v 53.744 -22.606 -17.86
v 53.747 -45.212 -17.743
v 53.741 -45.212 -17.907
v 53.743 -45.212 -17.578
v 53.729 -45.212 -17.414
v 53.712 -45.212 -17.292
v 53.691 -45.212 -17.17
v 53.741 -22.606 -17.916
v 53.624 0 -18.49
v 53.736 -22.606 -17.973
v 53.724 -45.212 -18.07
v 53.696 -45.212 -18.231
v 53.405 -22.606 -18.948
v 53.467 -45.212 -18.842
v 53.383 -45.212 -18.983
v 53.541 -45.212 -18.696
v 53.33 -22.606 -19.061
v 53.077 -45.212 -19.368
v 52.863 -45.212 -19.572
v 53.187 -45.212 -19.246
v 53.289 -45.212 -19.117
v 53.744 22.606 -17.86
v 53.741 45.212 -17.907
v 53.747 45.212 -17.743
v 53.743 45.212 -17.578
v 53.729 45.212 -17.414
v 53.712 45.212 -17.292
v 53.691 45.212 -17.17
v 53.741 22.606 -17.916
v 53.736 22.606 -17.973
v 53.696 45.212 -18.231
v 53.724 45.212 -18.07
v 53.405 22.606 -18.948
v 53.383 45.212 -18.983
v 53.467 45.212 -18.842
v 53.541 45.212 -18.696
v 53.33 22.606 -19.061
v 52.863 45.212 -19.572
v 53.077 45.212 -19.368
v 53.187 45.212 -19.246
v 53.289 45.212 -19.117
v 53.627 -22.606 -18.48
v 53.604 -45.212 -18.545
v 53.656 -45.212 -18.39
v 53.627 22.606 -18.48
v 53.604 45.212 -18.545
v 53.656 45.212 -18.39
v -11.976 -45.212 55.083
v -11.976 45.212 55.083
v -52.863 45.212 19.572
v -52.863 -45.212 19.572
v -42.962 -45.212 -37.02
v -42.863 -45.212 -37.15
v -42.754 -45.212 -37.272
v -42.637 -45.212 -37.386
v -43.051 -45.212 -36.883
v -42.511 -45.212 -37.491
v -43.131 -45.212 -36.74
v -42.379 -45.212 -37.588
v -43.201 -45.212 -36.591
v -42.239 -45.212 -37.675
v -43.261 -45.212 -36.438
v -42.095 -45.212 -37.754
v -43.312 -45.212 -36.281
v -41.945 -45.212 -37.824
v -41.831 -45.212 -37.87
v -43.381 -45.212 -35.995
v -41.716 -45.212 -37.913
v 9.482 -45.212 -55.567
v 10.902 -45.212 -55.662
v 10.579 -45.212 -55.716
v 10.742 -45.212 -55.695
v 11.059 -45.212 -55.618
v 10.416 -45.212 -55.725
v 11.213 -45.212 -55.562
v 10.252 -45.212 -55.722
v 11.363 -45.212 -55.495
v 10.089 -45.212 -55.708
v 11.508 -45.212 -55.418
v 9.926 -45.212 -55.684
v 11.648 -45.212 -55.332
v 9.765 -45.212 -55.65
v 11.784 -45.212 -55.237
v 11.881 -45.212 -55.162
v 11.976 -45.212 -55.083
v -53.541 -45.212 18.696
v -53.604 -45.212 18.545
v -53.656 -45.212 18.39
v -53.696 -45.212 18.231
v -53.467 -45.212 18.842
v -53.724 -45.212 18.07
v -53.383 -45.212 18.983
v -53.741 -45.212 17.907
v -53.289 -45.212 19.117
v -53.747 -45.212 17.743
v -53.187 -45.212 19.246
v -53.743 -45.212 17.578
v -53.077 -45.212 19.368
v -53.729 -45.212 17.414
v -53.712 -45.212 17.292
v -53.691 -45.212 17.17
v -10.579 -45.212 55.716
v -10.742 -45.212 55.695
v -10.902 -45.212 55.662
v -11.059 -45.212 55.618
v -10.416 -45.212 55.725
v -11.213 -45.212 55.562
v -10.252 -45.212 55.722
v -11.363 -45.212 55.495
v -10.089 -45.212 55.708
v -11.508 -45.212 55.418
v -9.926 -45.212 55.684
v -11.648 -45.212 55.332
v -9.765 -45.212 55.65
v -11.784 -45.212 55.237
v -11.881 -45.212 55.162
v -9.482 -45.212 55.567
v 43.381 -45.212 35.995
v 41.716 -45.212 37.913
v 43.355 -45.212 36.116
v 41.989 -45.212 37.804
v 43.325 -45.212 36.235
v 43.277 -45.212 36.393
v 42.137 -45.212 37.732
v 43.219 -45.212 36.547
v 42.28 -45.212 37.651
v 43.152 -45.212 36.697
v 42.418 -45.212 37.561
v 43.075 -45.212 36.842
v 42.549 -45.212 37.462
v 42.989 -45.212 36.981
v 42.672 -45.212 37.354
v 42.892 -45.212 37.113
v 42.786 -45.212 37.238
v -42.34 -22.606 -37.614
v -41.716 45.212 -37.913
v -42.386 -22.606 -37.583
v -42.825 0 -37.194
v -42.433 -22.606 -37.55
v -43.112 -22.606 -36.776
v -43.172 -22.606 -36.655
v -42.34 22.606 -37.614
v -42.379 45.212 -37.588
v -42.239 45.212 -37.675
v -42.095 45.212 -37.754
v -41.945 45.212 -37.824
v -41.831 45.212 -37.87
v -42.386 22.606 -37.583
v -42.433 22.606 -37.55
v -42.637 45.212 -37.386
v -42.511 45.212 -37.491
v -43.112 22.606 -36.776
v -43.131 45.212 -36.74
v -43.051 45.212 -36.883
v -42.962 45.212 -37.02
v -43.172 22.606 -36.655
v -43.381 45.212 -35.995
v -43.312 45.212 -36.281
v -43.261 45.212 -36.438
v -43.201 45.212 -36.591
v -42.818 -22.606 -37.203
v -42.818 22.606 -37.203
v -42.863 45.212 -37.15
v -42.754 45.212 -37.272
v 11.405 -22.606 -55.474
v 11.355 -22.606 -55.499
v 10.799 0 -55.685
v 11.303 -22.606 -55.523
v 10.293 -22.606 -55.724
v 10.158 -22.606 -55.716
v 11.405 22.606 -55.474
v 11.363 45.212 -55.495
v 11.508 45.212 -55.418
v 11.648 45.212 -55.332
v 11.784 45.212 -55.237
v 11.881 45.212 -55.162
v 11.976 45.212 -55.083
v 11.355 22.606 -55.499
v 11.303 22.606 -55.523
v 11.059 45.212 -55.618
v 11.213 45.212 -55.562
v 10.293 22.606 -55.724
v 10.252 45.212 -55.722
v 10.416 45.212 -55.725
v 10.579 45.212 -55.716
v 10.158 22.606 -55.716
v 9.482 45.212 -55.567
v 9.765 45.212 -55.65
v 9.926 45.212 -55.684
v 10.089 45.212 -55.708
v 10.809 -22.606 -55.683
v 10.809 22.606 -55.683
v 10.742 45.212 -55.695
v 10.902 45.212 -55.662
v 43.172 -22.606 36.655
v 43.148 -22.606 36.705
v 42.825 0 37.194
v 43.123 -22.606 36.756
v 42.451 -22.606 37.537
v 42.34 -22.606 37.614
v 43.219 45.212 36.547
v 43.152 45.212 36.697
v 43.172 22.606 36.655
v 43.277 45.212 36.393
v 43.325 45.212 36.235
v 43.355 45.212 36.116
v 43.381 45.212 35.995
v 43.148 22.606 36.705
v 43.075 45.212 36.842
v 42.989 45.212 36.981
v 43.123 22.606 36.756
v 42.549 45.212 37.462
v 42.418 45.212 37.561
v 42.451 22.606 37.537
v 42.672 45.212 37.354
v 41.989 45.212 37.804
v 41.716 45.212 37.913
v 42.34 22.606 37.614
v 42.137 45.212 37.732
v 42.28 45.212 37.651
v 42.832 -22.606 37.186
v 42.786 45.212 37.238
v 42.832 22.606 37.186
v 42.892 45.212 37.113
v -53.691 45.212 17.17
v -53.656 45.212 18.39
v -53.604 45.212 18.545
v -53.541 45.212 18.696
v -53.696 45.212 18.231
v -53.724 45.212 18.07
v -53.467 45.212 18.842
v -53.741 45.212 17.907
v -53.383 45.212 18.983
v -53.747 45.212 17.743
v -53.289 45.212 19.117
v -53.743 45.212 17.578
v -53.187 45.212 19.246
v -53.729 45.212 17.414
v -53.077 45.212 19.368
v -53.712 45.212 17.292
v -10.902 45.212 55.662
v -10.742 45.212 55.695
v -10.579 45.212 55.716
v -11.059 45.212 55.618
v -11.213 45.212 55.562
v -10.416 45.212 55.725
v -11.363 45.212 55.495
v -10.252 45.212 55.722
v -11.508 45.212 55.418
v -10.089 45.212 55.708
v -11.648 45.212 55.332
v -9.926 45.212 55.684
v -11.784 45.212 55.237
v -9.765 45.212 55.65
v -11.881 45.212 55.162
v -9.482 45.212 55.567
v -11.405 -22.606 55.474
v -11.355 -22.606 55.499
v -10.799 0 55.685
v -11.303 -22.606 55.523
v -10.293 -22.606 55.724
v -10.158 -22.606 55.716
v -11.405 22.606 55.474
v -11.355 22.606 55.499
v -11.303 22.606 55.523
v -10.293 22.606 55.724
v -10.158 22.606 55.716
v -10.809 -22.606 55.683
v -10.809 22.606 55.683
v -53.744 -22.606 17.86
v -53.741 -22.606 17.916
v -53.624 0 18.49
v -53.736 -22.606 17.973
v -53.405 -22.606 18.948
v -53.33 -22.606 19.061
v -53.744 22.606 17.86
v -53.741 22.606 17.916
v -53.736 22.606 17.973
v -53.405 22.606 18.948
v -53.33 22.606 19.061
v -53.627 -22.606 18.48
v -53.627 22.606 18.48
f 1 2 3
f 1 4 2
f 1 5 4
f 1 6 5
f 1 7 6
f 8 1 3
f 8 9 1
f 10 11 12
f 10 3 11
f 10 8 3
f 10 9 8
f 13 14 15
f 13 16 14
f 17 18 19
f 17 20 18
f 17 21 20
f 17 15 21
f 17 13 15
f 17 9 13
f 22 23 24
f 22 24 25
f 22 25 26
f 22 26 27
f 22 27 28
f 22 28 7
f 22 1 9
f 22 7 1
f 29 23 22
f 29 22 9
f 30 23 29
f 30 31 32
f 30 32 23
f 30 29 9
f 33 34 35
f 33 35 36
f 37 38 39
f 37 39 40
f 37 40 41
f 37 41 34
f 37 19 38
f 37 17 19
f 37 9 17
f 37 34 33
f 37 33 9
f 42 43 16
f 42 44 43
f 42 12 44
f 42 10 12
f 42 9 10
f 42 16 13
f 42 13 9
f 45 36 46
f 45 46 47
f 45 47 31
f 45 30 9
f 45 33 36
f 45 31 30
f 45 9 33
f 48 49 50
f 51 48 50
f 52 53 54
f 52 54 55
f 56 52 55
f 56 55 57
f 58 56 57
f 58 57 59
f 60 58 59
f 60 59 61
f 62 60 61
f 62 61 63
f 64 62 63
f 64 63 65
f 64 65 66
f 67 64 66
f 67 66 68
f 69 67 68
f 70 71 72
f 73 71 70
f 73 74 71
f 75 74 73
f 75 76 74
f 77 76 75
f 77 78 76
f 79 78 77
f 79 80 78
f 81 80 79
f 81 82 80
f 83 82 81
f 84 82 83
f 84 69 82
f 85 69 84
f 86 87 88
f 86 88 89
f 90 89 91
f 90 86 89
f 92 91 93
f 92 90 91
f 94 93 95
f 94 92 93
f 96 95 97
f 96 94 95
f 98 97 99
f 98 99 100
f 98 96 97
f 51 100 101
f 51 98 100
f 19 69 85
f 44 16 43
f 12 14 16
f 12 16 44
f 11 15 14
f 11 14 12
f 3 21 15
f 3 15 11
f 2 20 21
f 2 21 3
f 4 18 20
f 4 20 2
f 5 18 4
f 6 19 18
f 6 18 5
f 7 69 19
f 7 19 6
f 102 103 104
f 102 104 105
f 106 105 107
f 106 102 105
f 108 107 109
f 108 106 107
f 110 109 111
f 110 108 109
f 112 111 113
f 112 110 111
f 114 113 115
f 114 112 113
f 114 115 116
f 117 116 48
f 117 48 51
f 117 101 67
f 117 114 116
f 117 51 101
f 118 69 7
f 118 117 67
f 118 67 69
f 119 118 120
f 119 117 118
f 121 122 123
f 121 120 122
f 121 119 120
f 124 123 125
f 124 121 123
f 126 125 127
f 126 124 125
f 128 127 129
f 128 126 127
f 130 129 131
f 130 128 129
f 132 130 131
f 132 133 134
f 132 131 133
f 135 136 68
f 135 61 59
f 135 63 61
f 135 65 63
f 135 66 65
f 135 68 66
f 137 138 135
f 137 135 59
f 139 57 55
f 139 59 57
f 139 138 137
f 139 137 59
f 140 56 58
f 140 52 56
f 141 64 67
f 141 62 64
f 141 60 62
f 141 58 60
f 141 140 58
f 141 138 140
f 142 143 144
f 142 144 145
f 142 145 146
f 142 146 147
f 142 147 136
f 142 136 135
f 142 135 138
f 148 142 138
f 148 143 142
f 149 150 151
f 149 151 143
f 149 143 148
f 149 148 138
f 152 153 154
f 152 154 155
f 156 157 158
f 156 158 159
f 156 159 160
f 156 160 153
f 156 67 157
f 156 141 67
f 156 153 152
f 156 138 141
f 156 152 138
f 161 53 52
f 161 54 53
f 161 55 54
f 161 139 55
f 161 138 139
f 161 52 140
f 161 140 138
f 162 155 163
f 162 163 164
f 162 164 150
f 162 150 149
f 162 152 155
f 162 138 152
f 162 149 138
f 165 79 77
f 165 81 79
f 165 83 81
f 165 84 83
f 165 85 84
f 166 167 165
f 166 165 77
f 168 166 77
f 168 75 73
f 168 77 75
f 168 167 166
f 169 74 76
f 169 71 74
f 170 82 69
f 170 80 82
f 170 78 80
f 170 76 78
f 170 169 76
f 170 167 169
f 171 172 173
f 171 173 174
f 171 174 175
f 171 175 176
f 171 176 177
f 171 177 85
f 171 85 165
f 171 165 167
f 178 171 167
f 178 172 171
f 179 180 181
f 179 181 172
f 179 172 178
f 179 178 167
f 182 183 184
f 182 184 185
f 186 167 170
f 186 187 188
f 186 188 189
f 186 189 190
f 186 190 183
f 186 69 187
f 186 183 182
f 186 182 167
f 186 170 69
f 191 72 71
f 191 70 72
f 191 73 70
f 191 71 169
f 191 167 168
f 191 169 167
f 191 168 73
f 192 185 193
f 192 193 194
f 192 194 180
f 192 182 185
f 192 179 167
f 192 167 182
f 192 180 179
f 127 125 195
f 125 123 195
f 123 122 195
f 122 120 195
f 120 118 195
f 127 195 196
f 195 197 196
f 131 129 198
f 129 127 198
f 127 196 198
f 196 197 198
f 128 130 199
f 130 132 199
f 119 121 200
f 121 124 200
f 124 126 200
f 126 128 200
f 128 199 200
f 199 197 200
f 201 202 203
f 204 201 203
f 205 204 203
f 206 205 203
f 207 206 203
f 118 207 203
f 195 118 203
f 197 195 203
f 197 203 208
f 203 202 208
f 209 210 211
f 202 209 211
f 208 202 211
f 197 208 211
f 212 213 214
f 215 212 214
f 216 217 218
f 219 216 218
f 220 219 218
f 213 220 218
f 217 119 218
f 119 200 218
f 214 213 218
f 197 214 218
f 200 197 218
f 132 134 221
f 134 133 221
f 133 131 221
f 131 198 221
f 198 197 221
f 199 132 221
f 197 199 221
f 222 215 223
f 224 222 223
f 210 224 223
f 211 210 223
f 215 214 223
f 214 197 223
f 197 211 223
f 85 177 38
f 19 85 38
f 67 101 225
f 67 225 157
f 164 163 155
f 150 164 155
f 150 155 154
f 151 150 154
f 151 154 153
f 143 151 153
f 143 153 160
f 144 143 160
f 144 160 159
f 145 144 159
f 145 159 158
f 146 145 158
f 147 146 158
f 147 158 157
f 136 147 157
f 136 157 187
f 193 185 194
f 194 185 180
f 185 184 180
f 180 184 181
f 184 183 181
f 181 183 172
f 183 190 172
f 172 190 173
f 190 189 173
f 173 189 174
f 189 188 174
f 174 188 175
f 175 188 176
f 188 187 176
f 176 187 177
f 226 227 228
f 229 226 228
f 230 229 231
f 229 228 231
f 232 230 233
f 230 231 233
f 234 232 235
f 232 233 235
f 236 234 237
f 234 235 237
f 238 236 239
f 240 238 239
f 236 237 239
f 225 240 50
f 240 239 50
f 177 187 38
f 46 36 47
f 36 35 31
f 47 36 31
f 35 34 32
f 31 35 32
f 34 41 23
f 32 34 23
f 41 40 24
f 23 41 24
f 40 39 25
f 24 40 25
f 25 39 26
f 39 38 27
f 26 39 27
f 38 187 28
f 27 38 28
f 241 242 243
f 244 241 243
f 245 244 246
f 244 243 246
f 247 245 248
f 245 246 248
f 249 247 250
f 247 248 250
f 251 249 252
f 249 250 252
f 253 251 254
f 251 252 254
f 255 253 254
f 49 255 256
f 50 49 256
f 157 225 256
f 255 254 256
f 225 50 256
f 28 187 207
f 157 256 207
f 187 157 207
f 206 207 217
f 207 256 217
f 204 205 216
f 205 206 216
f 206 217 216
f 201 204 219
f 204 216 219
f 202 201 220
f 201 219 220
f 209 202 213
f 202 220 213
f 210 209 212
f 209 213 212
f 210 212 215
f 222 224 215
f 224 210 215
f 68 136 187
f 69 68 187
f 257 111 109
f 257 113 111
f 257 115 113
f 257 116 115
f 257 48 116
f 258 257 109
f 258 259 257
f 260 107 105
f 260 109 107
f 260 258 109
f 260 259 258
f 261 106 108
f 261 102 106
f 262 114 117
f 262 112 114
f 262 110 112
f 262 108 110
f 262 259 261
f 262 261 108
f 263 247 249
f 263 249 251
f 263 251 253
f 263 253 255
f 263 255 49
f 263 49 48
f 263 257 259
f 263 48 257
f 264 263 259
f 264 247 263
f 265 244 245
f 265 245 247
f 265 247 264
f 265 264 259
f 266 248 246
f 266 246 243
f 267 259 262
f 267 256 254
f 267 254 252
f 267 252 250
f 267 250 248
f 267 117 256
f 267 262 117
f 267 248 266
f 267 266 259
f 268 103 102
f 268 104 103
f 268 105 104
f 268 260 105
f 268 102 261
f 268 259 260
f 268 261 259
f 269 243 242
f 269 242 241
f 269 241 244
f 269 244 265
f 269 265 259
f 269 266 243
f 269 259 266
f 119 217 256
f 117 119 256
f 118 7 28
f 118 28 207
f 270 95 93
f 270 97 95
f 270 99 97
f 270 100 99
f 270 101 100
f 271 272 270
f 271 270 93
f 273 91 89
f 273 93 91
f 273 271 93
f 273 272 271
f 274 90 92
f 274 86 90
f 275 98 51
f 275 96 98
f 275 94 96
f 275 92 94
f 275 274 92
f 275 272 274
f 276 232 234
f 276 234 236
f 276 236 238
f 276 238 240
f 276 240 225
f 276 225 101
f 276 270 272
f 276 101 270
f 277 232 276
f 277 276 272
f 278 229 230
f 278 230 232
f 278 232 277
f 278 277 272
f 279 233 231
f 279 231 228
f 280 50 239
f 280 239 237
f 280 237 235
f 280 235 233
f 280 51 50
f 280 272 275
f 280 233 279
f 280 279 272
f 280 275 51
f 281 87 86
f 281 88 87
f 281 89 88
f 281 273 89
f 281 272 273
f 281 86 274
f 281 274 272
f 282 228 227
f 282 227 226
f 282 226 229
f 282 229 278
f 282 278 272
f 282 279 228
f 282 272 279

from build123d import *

# Parameters (mm, degrees)
F1_DEPTH    = 45.212
F2_T1_DEPTH = 97.7563484187


# Not quite as in the source:
# - a fillet or chamfer that OpenCascade refuses, or shapes differently, is made with other operations: its cross-section is extruded or revolved along the edge and cut away or added


with BuildPart() as f1:
    # F0 (on Front) → F1 (new body, symmetric)
    with BuildSketch(Plane.XZ):
        Polygon((53.9703455338, -18.609975213), (43.1018840651, 37.4347026768), (-10.8684614687, 56.0446778898), (-53.9703455338, 18.609975213), (-43.1018840651, -37.4347026768), (10.8684614687, -56.0446778898), align=None)
    extrude(amount=F1_DEPTH, both=True)

    # F2: fillet of radius 2.54 on 6 edges, made by hand

    # F2_s2 → F2_t1 (cut)
    with BuildSketch(Plane.XZ.offset(-48.8781742094)):
        with BuildLine():
            add(Edge.make_bspline(
                [(-11.9756422622, 55.0830729689), (-10.8684614687, 56.0446778898), (-9.4820967821, 55.5666336564)],
                knots=[0, 0, 0, 1, 1, 1], degree=2, weights=[1, 1, 1]))
            Line((-9.4820967821, 55.5666336564), (-10.8684614687, 56.0446778898))
            Line((-10.8684614687, 56.0446778898), (-11.9756422622, 55.0830729689))
        make_face()
        with BuildLine():
            add(Edge.make_bspline(
                [(43.3810679582, 35.9950535226), (43.1018840651, 37.4347026768), (41.7155193785, 37.9127469102)],
                knots=[0, 0, 0, 1, 1, 1], degree=2, weights=[1, 1, 1]))
            Line((41.7155193785, 37.9127469102), (43.1018840651, 37.4347026768))
            Line((43.1018840651, 37.4347026768), (43.3810679582, 35.9950535226))
        make_face()
        with BuildLine():
            add(Edge.make_bspline(
                [(-53.6911616407, 17.1703260588), (-53.9703455338, 18.609975213), (-52.8631647403, 19.5715801338)],
                knots=[0, 0, 0, 1, 1, 1], degree=2, weights=[1, 1, 1]))
            Line((-52.8631647403, 19.5715801338), (-53.9703455338, 18.609975213))
            Line((-53.9703455338, 18.609975213), (-53.6911616407, 17.1703260588))
        make_face()
        with BuildLine():
            add(Edge.make_bspline(
                [(-41.7155193785, -37.9127469102), (-43.1018840651, -37.4347026768), (-43.3810679582, -35.9950535226)],
                knots=[0, 0, 0, 1, 1, 1], degree=2, weights=[1, 1, 1]))
            Line((-43.3810679582, -35.9950535226), (-43.1018840651, -37.4347026768))
            Line((-43.1018840651, -37.4347026768), (-41.7155193785, -37.9127469102))
        make_face()
        with BuildLine():
            add(Edge.make_bspline(
                [(11.9756422622, -55.0830729689), (10.8684614687, -56.0446778898), (9.4820967821, -55.5666336564)],
                knots=[0, 0, 0, 1, 1, 1], degree=2, weights=[1, 1, 1]))
            Line((9.4820967821, -55.5666336564), (10.8684614687, -56.0446778898))
            Line((10.8684614687, -56.0446778898), (11.9756422622, -55.0830729689))
        make_face()
        with BuildLine():
            add(Edge.make_bspline(
                [(53.6911616407, -17.1703260588), (53.9703455338, -18.609975213), (52.8631647403, -19.5715801338)],
                knots=[0, 0, 0, 1, 1, 1], degree=2, weights=[1, 1, 1]))
            Line((52.8631647403, -19.5715801338), (53.9703455338, -18.609975213))
            Line((53.9703455338, -18.609975213), (53.6911616407, -17.1703260588))
        make_face()
    extrude(amount=F2_T1_DEPTH, mode=Mode.SUBTRACT)


solid = f1.part
